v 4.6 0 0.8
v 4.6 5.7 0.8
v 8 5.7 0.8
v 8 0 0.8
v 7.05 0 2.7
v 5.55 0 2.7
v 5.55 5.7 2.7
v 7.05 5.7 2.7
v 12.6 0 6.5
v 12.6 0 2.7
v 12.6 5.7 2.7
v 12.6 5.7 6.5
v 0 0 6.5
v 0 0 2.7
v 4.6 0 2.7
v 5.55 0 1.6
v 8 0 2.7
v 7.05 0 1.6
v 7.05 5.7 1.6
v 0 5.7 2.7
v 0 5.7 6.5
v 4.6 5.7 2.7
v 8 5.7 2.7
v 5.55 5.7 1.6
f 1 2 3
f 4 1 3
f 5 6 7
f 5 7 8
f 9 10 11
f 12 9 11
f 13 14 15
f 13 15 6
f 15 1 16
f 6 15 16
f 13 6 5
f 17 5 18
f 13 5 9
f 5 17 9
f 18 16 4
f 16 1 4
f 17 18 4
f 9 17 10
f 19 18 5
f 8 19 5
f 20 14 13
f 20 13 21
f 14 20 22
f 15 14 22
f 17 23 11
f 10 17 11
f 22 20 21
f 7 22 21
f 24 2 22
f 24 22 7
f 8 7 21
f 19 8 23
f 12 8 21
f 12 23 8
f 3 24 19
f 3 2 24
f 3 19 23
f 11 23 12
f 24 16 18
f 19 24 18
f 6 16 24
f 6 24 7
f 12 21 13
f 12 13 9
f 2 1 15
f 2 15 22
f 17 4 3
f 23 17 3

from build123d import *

# Parameters (mm, degrees)
SKETCH008_W      = 1.5
SKETCH008_H      = 1.1
EXTRUDE008_DEPTH = 5.7
BOX004_W         = 4.6
BOX004_H         = 5.7
BOX004_DEPTH     = 1.9
BOX003_W         = 4.6
BOX003_H         = 5.7
BOX003_DEPTH     = 1.9
BOX002_W         = 12.6
BOX002_H         = 5.7
BOX002_DEPTH     = 5.7


with BuildPart() as extrude008:
    # Sketch008 (on Sketch) → Extrude008 (new body)
    with BuildSketch(Plane.XZ):
        with Locations((6.3, 2.15)):
            Rectangle(SKETCH008_W, SKETCH008_H)
    extrude(amount=-EXTRUDE008_DEPTH)


with BuildPart() as cube004:
    # Box004 → Box004 (new body)
    with BuildSketch(Plane(origin=(8, 0, 0.8), x_dir=(1, 0, 0), z_dir=(0, 0, 1))):
        with Locations((2.3, 2.85)):
            Rectangle(BOX004_W, BOX004_H)
    extrude(amount=BOX004_DEPTH)


with BuildPart() as cube003:
    # Box003 → Box003 (new body)
    with BuildSketch(Plane.XY.offset(0.8)):
        with Locations((2.3, 2.85)):
            Rectangle(BOX003_W, BOX003_H)
    extrude(amount=BOX003_DEPTH)


with BuildPart() as cut015:
    # Box002 → Box002 (new body)
    with BuildSketch(Plane.XY.offset(0.8)):
        with Locations((6.3, 2.85)):
            Rectangle(BOX002_W, BOX002_H)
    extrude(amount=BOX002_DEPTH)

    # Cut: cut Cube003
    add(cube003.part, mode=Mode.SUBTRACT)

    # Cut001: cut Cube004
    add(cube004.part, mode=Mode.SUBTRACT)

    # Cut015: cut Extrude008
    add(extrude008.part, mode=Mode.SUBTRACT)


solid = cut015.part
